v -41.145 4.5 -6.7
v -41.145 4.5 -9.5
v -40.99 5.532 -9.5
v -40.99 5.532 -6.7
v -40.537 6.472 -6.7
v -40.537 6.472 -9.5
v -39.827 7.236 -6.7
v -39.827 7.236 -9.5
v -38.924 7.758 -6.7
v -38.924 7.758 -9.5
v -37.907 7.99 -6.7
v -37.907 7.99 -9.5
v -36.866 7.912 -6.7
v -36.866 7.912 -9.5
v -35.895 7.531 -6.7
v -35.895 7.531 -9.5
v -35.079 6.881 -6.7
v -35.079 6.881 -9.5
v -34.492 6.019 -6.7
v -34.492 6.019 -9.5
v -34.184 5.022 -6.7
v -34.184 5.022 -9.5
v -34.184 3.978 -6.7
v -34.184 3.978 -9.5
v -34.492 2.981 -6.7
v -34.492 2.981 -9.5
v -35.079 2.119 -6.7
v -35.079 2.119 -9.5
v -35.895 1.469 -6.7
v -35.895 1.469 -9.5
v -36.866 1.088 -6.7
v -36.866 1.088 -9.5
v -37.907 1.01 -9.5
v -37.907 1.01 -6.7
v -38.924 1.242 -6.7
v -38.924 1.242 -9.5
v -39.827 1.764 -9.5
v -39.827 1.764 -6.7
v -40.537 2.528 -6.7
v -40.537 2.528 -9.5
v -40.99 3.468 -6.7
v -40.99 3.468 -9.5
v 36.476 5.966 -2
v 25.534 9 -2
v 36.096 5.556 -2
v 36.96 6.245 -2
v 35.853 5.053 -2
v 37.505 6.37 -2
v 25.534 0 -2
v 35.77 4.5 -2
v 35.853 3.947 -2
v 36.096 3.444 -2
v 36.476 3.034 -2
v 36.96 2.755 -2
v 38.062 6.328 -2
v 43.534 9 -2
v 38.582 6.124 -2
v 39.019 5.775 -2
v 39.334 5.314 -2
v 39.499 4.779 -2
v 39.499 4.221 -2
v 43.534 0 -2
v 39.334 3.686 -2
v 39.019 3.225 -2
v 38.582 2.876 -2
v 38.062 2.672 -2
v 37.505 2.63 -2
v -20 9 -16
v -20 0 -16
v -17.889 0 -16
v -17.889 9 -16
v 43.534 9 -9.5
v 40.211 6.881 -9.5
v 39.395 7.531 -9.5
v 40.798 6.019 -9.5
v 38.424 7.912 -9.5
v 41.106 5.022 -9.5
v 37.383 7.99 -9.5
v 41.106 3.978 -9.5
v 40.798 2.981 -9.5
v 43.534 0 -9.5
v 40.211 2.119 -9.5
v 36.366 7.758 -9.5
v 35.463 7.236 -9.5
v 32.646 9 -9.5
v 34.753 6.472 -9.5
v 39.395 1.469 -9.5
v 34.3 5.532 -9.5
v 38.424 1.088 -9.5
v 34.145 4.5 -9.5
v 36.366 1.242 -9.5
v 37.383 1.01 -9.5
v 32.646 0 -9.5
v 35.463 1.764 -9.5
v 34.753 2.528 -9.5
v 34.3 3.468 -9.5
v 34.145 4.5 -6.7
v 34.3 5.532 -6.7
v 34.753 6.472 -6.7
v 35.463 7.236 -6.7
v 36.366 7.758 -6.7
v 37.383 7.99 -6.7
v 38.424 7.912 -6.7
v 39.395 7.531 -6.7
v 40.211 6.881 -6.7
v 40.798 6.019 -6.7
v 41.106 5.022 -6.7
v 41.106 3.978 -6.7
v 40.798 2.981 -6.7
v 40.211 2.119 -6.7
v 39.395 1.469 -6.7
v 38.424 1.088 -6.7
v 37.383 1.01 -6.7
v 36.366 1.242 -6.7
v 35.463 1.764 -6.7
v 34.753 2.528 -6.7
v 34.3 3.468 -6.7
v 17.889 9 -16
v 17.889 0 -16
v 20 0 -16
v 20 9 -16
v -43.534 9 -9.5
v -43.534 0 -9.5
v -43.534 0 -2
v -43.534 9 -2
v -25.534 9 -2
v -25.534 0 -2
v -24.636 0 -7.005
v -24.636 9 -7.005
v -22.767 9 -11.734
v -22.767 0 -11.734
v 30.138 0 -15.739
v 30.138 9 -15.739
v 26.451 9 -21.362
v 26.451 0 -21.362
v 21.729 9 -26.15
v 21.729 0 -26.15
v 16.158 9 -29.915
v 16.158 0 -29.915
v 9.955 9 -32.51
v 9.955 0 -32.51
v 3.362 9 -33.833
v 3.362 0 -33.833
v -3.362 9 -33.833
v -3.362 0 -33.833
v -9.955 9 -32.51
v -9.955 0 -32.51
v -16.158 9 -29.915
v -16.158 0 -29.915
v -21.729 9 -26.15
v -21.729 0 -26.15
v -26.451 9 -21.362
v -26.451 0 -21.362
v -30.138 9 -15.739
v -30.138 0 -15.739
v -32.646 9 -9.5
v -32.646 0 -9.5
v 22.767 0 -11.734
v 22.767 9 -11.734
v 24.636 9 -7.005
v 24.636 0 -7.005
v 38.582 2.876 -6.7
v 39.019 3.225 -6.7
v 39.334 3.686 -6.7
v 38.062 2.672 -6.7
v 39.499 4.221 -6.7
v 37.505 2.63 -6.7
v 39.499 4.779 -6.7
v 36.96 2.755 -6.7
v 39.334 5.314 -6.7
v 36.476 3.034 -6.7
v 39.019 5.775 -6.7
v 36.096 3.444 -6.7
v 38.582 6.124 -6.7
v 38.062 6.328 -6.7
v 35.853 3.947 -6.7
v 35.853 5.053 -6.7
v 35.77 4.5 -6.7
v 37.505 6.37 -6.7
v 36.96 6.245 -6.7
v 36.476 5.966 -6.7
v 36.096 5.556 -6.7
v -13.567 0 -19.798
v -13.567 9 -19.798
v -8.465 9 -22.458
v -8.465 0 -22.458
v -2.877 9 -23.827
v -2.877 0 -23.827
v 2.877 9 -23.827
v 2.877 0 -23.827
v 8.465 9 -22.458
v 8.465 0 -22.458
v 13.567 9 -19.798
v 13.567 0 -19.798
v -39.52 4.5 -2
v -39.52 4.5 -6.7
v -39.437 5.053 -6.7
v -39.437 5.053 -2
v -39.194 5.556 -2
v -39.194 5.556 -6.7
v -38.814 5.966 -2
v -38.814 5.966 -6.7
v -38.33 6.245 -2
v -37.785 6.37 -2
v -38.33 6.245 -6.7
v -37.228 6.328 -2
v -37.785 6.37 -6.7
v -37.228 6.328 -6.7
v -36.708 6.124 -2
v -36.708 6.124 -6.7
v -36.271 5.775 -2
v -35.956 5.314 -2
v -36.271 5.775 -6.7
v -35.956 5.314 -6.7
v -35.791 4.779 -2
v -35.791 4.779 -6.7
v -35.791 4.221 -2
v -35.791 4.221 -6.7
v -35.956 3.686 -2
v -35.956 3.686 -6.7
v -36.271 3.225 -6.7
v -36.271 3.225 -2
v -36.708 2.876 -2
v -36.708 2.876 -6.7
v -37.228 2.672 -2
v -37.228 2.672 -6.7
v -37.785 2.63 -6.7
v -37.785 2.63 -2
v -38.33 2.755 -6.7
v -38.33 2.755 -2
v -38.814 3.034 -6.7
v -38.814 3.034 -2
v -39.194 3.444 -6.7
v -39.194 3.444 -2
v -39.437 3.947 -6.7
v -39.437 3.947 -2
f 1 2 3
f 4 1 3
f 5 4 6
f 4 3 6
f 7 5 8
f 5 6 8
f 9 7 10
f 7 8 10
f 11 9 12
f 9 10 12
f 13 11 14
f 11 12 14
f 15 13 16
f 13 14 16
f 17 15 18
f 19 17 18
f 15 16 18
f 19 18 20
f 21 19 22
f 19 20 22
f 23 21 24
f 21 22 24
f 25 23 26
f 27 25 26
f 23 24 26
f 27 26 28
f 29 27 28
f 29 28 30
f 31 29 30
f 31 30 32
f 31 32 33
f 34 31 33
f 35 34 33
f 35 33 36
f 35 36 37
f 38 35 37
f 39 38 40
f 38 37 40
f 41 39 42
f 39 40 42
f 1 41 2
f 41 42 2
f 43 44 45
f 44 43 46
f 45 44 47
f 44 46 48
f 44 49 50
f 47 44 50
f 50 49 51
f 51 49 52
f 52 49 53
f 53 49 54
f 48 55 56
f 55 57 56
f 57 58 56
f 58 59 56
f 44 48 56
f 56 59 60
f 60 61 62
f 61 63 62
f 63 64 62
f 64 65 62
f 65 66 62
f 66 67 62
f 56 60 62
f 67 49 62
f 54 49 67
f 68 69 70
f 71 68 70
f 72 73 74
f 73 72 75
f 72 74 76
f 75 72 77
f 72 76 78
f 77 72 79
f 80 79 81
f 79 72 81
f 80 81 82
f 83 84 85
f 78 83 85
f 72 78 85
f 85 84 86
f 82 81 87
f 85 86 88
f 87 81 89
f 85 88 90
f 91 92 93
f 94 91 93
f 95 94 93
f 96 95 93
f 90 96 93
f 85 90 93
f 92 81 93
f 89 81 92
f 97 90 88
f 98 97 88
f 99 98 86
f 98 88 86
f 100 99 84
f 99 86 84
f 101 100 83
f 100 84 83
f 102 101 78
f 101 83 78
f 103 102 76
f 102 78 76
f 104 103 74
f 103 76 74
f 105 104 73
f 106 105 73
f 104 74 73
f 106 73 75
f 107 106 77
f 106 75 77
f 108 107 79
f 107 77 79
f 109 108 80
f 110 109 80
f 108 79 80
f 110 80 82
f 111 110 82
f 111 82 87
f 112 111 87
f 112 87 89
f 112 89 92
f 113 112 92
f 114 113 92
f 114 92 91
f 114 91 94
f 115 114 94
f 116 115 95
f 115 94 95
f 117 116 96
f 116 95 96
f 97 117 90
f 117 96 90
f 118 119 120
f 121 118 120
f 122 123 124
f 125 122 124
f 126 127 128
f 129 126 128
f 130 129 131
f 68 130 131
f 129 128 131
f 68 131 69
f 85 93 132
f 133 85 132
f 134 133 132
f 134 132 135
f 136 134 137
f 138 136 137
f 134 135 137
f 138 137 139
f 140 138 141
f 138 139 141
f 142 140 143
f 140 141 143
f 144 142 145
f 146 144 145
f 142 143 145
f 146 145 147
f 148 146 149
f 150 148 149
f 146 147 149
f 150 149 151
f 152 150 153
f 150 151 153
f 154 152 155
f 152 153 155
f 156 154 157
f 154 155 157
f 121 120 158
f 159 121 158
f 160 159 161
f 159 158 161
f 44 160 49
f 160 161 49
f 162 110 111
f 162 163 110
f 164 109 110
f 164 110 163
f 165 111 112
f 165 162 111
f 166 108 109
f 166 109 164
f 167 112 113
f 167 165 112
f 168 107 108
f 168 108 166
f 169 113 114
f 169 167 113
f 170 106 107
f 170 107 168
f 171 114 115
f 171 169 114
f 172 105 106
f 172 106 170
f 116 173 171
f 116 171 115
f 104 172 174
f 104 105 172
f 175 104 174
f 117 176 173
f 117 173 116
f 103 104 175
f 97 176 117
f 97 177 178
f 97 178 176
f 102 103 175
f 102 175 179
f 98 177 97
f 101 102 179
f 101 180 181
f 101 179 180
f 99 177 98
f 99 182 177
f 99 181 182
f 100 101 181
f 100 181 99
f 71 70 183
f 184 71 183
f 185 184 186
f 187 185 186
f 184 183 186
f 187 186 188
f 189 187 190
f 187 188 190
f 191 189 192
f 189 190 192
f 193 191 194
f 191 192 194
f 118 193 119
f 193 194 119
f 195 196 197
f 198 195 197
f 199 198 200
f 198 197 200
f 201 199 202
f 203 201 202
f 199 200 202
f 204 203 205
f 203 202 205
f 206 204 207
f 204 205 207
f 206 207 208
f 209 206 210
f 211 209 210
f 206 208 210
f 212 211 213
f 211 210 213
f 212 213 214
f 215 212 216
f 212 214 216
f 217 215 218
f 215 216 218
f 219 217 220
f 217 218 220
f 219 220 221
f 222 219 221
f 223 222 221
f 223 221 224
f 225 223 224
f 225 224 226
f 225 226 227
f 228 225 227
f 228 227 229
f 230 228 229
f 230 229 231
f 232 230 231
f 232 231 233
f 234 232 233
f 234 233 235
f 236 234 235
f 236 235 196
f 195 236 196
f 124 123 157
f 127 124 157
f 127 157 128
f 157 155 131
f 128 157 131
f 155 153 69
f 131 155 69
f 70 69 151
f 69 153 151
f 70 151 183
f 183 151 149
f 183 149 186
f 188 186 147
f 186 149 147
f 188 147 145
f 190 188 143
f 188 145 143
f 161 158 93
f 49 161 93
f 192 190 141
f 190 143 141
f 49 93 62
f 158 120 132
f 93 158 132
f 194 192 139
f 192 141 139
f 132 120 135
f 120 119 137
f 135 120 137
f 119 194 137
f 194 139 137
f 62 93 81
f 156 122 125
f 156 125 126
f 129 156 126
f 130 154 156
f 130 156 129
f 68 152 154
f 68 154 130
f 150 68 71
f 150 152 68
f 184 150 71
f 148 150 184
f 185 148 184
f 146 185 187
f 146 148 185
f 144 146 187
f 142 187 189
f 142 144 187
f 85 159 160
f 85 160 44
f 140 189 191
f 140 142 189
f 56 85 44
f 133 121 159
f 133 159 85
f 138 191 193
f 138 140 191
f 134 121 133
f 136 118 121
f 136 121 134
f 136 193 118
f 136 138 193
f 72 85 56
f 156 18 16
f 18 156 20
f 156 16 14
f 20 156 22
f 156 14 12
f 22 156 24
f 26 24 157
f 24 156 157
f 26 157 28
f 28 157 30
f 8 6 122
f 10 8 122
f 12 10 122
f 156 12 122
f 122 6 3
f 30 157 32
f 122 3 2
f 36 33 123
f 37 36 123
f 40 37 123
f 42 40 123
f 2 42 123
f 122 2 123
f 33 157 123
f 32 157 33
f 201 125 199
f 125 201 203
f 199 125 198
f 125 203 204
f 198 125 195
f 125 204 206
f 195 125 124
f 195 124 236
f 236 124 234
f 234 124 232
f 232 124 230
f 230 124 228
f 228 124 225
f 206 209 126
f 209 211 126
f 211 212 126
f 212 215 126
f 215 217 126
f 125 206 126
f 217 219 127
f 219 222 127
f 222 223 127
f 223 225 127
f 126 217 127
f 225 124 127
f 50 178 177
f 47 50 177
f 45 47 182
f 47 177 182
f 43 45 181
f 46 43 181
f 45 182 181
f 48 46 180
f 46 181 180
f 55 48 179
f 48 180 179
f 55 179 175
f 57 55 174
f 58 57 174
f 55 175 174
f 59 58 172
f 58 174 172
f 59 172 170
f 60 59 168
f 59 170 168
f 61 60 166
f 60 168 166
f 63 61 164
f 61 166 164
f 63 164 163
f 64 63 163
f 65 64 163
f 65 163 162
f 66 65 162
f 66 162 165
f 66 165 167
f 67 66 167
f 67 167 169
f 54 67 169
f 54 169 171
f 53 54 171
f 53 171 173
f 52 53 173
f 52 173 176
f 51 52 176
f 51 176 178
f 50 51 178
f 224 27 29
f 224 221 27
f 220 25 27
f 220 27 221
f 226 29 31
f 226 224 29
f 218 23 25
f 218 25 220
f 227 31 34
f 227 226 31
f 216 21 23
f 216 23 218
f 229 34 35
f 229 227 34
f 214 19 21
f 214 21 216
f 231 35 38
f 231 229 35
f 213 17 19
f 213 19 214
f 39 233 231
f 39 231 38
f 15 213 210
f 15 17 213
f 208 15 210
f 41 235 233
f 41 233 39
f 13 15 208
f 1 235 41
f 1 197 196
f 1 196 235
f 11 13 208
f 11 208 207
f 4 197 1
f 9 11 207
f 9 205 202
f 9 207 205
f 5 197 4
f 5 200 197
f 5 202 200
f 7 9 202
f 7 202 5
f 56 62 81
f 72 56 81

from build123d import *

# Parameters (mm, degrees)
SALIENTE_EXTRUIR1_DEPTH = 9
CROQUIS2_R              = 1.875
CORTAR_EXTRUIR1_DEPTH   = 51.759082577
CROQUIS2_3_R            = 3.5
CROQUIS2_3_R_2          = 1.875
CORTAR_EXTRUIR2_DEPTH   = 2.8


with BuildPart() as part:
    # Croquis1 → Saliente-Extruir1 (new body)
    with BuildSketch(Plane(origin=(0, 0, 0), x_dir=(1, 0, 0), z_dir=(0, 1, 0))):
        with BuildLine():
            Line((17.88854382, 16), (20, 16))
            ThreePointArc((20, 16), (23.818961075, 9.415789574), (25.53429067, 2))
            Line((25.53429067, 2), (43.53429067, 2))
            Line((43.53429067, 2), (43.53429067, 9.5))
            Line((43.53429067, 9.5), (32.645826686, 9.5))
            ThreePointArc((32.645826686, 9.5), (0, 34), (-32.645826686, 9.5))
            Line((-32.645826686, 9.5), (-43.53429067, 9.5))
            Line((-43.53429067, 9.5), (-43.53429067, 2))
            Line((-43.53429067, 2), (-25.53429067, 2))
            ThreePointArc((-25.53429067, 2), (-23.818961075, 9.415789574), (-20, 16))
            Line((-20, 16), (-17.88854382, 16))
            ThreePointArc((-17.88854382, 16), (0, 24), (17.88854382, 16))
        make_face()
    extrude(amount=SALIENTE_EXTRUIR1_DEPTH)

    # Croquis2 → Cortar-Extruir1 (cut, through all)
    with BuildSketch(Plane(origin=(0, 0, -9.5), x_dir=(-1, 0, 0), z_dir=(0, 0, -1))):
        with Locations((-37.645, 4.5)):
            Circle(CROQUIS2_R)
        with Locations((37.645, 4.5)):
            Circle(CROQUIS2_R)
    extrude(amount=-CORTAR_EXTRUIR1_DEPTH, mode=Mode.SUBTRACT)

    # Croquis2<3> → Cortar-Extruir2 (cut)
    # profile 1 of 2: a face of its own
    with BuildSketch(Plane(origin=(0, 0, -9.5), x_dir=(-1, 0, 0), z_dir=(0, 0, -1))):
        with Locations((-37.645, 4.5)):
            Circle(CROQUIS2_3_R)
        with Locations((-37.645, 4.5)):
            Circle(CROQUIS2_3_R_2, mode=Mode.SUBTRACT)
    # profile 2 of 2: a face of its own
    with BuildSketch(Plane(origin=(0, 0, -9.5), x_dir=(-1, 0, 0), z_dir=(0, 0, -1))):
        with Locations((37.645, 4.5)):
            Circle(CROQUIS2_3_R)
        with Locations((37.645, 4.5)):
            Circle(CROQUIS2_3_R_2, mode=Mode.SUBTRACT)
    extrude(amount=-CORTAR_EXTRUIR2_DEPTH, mode=Mode.SUBTRACT)


solid = part.part
